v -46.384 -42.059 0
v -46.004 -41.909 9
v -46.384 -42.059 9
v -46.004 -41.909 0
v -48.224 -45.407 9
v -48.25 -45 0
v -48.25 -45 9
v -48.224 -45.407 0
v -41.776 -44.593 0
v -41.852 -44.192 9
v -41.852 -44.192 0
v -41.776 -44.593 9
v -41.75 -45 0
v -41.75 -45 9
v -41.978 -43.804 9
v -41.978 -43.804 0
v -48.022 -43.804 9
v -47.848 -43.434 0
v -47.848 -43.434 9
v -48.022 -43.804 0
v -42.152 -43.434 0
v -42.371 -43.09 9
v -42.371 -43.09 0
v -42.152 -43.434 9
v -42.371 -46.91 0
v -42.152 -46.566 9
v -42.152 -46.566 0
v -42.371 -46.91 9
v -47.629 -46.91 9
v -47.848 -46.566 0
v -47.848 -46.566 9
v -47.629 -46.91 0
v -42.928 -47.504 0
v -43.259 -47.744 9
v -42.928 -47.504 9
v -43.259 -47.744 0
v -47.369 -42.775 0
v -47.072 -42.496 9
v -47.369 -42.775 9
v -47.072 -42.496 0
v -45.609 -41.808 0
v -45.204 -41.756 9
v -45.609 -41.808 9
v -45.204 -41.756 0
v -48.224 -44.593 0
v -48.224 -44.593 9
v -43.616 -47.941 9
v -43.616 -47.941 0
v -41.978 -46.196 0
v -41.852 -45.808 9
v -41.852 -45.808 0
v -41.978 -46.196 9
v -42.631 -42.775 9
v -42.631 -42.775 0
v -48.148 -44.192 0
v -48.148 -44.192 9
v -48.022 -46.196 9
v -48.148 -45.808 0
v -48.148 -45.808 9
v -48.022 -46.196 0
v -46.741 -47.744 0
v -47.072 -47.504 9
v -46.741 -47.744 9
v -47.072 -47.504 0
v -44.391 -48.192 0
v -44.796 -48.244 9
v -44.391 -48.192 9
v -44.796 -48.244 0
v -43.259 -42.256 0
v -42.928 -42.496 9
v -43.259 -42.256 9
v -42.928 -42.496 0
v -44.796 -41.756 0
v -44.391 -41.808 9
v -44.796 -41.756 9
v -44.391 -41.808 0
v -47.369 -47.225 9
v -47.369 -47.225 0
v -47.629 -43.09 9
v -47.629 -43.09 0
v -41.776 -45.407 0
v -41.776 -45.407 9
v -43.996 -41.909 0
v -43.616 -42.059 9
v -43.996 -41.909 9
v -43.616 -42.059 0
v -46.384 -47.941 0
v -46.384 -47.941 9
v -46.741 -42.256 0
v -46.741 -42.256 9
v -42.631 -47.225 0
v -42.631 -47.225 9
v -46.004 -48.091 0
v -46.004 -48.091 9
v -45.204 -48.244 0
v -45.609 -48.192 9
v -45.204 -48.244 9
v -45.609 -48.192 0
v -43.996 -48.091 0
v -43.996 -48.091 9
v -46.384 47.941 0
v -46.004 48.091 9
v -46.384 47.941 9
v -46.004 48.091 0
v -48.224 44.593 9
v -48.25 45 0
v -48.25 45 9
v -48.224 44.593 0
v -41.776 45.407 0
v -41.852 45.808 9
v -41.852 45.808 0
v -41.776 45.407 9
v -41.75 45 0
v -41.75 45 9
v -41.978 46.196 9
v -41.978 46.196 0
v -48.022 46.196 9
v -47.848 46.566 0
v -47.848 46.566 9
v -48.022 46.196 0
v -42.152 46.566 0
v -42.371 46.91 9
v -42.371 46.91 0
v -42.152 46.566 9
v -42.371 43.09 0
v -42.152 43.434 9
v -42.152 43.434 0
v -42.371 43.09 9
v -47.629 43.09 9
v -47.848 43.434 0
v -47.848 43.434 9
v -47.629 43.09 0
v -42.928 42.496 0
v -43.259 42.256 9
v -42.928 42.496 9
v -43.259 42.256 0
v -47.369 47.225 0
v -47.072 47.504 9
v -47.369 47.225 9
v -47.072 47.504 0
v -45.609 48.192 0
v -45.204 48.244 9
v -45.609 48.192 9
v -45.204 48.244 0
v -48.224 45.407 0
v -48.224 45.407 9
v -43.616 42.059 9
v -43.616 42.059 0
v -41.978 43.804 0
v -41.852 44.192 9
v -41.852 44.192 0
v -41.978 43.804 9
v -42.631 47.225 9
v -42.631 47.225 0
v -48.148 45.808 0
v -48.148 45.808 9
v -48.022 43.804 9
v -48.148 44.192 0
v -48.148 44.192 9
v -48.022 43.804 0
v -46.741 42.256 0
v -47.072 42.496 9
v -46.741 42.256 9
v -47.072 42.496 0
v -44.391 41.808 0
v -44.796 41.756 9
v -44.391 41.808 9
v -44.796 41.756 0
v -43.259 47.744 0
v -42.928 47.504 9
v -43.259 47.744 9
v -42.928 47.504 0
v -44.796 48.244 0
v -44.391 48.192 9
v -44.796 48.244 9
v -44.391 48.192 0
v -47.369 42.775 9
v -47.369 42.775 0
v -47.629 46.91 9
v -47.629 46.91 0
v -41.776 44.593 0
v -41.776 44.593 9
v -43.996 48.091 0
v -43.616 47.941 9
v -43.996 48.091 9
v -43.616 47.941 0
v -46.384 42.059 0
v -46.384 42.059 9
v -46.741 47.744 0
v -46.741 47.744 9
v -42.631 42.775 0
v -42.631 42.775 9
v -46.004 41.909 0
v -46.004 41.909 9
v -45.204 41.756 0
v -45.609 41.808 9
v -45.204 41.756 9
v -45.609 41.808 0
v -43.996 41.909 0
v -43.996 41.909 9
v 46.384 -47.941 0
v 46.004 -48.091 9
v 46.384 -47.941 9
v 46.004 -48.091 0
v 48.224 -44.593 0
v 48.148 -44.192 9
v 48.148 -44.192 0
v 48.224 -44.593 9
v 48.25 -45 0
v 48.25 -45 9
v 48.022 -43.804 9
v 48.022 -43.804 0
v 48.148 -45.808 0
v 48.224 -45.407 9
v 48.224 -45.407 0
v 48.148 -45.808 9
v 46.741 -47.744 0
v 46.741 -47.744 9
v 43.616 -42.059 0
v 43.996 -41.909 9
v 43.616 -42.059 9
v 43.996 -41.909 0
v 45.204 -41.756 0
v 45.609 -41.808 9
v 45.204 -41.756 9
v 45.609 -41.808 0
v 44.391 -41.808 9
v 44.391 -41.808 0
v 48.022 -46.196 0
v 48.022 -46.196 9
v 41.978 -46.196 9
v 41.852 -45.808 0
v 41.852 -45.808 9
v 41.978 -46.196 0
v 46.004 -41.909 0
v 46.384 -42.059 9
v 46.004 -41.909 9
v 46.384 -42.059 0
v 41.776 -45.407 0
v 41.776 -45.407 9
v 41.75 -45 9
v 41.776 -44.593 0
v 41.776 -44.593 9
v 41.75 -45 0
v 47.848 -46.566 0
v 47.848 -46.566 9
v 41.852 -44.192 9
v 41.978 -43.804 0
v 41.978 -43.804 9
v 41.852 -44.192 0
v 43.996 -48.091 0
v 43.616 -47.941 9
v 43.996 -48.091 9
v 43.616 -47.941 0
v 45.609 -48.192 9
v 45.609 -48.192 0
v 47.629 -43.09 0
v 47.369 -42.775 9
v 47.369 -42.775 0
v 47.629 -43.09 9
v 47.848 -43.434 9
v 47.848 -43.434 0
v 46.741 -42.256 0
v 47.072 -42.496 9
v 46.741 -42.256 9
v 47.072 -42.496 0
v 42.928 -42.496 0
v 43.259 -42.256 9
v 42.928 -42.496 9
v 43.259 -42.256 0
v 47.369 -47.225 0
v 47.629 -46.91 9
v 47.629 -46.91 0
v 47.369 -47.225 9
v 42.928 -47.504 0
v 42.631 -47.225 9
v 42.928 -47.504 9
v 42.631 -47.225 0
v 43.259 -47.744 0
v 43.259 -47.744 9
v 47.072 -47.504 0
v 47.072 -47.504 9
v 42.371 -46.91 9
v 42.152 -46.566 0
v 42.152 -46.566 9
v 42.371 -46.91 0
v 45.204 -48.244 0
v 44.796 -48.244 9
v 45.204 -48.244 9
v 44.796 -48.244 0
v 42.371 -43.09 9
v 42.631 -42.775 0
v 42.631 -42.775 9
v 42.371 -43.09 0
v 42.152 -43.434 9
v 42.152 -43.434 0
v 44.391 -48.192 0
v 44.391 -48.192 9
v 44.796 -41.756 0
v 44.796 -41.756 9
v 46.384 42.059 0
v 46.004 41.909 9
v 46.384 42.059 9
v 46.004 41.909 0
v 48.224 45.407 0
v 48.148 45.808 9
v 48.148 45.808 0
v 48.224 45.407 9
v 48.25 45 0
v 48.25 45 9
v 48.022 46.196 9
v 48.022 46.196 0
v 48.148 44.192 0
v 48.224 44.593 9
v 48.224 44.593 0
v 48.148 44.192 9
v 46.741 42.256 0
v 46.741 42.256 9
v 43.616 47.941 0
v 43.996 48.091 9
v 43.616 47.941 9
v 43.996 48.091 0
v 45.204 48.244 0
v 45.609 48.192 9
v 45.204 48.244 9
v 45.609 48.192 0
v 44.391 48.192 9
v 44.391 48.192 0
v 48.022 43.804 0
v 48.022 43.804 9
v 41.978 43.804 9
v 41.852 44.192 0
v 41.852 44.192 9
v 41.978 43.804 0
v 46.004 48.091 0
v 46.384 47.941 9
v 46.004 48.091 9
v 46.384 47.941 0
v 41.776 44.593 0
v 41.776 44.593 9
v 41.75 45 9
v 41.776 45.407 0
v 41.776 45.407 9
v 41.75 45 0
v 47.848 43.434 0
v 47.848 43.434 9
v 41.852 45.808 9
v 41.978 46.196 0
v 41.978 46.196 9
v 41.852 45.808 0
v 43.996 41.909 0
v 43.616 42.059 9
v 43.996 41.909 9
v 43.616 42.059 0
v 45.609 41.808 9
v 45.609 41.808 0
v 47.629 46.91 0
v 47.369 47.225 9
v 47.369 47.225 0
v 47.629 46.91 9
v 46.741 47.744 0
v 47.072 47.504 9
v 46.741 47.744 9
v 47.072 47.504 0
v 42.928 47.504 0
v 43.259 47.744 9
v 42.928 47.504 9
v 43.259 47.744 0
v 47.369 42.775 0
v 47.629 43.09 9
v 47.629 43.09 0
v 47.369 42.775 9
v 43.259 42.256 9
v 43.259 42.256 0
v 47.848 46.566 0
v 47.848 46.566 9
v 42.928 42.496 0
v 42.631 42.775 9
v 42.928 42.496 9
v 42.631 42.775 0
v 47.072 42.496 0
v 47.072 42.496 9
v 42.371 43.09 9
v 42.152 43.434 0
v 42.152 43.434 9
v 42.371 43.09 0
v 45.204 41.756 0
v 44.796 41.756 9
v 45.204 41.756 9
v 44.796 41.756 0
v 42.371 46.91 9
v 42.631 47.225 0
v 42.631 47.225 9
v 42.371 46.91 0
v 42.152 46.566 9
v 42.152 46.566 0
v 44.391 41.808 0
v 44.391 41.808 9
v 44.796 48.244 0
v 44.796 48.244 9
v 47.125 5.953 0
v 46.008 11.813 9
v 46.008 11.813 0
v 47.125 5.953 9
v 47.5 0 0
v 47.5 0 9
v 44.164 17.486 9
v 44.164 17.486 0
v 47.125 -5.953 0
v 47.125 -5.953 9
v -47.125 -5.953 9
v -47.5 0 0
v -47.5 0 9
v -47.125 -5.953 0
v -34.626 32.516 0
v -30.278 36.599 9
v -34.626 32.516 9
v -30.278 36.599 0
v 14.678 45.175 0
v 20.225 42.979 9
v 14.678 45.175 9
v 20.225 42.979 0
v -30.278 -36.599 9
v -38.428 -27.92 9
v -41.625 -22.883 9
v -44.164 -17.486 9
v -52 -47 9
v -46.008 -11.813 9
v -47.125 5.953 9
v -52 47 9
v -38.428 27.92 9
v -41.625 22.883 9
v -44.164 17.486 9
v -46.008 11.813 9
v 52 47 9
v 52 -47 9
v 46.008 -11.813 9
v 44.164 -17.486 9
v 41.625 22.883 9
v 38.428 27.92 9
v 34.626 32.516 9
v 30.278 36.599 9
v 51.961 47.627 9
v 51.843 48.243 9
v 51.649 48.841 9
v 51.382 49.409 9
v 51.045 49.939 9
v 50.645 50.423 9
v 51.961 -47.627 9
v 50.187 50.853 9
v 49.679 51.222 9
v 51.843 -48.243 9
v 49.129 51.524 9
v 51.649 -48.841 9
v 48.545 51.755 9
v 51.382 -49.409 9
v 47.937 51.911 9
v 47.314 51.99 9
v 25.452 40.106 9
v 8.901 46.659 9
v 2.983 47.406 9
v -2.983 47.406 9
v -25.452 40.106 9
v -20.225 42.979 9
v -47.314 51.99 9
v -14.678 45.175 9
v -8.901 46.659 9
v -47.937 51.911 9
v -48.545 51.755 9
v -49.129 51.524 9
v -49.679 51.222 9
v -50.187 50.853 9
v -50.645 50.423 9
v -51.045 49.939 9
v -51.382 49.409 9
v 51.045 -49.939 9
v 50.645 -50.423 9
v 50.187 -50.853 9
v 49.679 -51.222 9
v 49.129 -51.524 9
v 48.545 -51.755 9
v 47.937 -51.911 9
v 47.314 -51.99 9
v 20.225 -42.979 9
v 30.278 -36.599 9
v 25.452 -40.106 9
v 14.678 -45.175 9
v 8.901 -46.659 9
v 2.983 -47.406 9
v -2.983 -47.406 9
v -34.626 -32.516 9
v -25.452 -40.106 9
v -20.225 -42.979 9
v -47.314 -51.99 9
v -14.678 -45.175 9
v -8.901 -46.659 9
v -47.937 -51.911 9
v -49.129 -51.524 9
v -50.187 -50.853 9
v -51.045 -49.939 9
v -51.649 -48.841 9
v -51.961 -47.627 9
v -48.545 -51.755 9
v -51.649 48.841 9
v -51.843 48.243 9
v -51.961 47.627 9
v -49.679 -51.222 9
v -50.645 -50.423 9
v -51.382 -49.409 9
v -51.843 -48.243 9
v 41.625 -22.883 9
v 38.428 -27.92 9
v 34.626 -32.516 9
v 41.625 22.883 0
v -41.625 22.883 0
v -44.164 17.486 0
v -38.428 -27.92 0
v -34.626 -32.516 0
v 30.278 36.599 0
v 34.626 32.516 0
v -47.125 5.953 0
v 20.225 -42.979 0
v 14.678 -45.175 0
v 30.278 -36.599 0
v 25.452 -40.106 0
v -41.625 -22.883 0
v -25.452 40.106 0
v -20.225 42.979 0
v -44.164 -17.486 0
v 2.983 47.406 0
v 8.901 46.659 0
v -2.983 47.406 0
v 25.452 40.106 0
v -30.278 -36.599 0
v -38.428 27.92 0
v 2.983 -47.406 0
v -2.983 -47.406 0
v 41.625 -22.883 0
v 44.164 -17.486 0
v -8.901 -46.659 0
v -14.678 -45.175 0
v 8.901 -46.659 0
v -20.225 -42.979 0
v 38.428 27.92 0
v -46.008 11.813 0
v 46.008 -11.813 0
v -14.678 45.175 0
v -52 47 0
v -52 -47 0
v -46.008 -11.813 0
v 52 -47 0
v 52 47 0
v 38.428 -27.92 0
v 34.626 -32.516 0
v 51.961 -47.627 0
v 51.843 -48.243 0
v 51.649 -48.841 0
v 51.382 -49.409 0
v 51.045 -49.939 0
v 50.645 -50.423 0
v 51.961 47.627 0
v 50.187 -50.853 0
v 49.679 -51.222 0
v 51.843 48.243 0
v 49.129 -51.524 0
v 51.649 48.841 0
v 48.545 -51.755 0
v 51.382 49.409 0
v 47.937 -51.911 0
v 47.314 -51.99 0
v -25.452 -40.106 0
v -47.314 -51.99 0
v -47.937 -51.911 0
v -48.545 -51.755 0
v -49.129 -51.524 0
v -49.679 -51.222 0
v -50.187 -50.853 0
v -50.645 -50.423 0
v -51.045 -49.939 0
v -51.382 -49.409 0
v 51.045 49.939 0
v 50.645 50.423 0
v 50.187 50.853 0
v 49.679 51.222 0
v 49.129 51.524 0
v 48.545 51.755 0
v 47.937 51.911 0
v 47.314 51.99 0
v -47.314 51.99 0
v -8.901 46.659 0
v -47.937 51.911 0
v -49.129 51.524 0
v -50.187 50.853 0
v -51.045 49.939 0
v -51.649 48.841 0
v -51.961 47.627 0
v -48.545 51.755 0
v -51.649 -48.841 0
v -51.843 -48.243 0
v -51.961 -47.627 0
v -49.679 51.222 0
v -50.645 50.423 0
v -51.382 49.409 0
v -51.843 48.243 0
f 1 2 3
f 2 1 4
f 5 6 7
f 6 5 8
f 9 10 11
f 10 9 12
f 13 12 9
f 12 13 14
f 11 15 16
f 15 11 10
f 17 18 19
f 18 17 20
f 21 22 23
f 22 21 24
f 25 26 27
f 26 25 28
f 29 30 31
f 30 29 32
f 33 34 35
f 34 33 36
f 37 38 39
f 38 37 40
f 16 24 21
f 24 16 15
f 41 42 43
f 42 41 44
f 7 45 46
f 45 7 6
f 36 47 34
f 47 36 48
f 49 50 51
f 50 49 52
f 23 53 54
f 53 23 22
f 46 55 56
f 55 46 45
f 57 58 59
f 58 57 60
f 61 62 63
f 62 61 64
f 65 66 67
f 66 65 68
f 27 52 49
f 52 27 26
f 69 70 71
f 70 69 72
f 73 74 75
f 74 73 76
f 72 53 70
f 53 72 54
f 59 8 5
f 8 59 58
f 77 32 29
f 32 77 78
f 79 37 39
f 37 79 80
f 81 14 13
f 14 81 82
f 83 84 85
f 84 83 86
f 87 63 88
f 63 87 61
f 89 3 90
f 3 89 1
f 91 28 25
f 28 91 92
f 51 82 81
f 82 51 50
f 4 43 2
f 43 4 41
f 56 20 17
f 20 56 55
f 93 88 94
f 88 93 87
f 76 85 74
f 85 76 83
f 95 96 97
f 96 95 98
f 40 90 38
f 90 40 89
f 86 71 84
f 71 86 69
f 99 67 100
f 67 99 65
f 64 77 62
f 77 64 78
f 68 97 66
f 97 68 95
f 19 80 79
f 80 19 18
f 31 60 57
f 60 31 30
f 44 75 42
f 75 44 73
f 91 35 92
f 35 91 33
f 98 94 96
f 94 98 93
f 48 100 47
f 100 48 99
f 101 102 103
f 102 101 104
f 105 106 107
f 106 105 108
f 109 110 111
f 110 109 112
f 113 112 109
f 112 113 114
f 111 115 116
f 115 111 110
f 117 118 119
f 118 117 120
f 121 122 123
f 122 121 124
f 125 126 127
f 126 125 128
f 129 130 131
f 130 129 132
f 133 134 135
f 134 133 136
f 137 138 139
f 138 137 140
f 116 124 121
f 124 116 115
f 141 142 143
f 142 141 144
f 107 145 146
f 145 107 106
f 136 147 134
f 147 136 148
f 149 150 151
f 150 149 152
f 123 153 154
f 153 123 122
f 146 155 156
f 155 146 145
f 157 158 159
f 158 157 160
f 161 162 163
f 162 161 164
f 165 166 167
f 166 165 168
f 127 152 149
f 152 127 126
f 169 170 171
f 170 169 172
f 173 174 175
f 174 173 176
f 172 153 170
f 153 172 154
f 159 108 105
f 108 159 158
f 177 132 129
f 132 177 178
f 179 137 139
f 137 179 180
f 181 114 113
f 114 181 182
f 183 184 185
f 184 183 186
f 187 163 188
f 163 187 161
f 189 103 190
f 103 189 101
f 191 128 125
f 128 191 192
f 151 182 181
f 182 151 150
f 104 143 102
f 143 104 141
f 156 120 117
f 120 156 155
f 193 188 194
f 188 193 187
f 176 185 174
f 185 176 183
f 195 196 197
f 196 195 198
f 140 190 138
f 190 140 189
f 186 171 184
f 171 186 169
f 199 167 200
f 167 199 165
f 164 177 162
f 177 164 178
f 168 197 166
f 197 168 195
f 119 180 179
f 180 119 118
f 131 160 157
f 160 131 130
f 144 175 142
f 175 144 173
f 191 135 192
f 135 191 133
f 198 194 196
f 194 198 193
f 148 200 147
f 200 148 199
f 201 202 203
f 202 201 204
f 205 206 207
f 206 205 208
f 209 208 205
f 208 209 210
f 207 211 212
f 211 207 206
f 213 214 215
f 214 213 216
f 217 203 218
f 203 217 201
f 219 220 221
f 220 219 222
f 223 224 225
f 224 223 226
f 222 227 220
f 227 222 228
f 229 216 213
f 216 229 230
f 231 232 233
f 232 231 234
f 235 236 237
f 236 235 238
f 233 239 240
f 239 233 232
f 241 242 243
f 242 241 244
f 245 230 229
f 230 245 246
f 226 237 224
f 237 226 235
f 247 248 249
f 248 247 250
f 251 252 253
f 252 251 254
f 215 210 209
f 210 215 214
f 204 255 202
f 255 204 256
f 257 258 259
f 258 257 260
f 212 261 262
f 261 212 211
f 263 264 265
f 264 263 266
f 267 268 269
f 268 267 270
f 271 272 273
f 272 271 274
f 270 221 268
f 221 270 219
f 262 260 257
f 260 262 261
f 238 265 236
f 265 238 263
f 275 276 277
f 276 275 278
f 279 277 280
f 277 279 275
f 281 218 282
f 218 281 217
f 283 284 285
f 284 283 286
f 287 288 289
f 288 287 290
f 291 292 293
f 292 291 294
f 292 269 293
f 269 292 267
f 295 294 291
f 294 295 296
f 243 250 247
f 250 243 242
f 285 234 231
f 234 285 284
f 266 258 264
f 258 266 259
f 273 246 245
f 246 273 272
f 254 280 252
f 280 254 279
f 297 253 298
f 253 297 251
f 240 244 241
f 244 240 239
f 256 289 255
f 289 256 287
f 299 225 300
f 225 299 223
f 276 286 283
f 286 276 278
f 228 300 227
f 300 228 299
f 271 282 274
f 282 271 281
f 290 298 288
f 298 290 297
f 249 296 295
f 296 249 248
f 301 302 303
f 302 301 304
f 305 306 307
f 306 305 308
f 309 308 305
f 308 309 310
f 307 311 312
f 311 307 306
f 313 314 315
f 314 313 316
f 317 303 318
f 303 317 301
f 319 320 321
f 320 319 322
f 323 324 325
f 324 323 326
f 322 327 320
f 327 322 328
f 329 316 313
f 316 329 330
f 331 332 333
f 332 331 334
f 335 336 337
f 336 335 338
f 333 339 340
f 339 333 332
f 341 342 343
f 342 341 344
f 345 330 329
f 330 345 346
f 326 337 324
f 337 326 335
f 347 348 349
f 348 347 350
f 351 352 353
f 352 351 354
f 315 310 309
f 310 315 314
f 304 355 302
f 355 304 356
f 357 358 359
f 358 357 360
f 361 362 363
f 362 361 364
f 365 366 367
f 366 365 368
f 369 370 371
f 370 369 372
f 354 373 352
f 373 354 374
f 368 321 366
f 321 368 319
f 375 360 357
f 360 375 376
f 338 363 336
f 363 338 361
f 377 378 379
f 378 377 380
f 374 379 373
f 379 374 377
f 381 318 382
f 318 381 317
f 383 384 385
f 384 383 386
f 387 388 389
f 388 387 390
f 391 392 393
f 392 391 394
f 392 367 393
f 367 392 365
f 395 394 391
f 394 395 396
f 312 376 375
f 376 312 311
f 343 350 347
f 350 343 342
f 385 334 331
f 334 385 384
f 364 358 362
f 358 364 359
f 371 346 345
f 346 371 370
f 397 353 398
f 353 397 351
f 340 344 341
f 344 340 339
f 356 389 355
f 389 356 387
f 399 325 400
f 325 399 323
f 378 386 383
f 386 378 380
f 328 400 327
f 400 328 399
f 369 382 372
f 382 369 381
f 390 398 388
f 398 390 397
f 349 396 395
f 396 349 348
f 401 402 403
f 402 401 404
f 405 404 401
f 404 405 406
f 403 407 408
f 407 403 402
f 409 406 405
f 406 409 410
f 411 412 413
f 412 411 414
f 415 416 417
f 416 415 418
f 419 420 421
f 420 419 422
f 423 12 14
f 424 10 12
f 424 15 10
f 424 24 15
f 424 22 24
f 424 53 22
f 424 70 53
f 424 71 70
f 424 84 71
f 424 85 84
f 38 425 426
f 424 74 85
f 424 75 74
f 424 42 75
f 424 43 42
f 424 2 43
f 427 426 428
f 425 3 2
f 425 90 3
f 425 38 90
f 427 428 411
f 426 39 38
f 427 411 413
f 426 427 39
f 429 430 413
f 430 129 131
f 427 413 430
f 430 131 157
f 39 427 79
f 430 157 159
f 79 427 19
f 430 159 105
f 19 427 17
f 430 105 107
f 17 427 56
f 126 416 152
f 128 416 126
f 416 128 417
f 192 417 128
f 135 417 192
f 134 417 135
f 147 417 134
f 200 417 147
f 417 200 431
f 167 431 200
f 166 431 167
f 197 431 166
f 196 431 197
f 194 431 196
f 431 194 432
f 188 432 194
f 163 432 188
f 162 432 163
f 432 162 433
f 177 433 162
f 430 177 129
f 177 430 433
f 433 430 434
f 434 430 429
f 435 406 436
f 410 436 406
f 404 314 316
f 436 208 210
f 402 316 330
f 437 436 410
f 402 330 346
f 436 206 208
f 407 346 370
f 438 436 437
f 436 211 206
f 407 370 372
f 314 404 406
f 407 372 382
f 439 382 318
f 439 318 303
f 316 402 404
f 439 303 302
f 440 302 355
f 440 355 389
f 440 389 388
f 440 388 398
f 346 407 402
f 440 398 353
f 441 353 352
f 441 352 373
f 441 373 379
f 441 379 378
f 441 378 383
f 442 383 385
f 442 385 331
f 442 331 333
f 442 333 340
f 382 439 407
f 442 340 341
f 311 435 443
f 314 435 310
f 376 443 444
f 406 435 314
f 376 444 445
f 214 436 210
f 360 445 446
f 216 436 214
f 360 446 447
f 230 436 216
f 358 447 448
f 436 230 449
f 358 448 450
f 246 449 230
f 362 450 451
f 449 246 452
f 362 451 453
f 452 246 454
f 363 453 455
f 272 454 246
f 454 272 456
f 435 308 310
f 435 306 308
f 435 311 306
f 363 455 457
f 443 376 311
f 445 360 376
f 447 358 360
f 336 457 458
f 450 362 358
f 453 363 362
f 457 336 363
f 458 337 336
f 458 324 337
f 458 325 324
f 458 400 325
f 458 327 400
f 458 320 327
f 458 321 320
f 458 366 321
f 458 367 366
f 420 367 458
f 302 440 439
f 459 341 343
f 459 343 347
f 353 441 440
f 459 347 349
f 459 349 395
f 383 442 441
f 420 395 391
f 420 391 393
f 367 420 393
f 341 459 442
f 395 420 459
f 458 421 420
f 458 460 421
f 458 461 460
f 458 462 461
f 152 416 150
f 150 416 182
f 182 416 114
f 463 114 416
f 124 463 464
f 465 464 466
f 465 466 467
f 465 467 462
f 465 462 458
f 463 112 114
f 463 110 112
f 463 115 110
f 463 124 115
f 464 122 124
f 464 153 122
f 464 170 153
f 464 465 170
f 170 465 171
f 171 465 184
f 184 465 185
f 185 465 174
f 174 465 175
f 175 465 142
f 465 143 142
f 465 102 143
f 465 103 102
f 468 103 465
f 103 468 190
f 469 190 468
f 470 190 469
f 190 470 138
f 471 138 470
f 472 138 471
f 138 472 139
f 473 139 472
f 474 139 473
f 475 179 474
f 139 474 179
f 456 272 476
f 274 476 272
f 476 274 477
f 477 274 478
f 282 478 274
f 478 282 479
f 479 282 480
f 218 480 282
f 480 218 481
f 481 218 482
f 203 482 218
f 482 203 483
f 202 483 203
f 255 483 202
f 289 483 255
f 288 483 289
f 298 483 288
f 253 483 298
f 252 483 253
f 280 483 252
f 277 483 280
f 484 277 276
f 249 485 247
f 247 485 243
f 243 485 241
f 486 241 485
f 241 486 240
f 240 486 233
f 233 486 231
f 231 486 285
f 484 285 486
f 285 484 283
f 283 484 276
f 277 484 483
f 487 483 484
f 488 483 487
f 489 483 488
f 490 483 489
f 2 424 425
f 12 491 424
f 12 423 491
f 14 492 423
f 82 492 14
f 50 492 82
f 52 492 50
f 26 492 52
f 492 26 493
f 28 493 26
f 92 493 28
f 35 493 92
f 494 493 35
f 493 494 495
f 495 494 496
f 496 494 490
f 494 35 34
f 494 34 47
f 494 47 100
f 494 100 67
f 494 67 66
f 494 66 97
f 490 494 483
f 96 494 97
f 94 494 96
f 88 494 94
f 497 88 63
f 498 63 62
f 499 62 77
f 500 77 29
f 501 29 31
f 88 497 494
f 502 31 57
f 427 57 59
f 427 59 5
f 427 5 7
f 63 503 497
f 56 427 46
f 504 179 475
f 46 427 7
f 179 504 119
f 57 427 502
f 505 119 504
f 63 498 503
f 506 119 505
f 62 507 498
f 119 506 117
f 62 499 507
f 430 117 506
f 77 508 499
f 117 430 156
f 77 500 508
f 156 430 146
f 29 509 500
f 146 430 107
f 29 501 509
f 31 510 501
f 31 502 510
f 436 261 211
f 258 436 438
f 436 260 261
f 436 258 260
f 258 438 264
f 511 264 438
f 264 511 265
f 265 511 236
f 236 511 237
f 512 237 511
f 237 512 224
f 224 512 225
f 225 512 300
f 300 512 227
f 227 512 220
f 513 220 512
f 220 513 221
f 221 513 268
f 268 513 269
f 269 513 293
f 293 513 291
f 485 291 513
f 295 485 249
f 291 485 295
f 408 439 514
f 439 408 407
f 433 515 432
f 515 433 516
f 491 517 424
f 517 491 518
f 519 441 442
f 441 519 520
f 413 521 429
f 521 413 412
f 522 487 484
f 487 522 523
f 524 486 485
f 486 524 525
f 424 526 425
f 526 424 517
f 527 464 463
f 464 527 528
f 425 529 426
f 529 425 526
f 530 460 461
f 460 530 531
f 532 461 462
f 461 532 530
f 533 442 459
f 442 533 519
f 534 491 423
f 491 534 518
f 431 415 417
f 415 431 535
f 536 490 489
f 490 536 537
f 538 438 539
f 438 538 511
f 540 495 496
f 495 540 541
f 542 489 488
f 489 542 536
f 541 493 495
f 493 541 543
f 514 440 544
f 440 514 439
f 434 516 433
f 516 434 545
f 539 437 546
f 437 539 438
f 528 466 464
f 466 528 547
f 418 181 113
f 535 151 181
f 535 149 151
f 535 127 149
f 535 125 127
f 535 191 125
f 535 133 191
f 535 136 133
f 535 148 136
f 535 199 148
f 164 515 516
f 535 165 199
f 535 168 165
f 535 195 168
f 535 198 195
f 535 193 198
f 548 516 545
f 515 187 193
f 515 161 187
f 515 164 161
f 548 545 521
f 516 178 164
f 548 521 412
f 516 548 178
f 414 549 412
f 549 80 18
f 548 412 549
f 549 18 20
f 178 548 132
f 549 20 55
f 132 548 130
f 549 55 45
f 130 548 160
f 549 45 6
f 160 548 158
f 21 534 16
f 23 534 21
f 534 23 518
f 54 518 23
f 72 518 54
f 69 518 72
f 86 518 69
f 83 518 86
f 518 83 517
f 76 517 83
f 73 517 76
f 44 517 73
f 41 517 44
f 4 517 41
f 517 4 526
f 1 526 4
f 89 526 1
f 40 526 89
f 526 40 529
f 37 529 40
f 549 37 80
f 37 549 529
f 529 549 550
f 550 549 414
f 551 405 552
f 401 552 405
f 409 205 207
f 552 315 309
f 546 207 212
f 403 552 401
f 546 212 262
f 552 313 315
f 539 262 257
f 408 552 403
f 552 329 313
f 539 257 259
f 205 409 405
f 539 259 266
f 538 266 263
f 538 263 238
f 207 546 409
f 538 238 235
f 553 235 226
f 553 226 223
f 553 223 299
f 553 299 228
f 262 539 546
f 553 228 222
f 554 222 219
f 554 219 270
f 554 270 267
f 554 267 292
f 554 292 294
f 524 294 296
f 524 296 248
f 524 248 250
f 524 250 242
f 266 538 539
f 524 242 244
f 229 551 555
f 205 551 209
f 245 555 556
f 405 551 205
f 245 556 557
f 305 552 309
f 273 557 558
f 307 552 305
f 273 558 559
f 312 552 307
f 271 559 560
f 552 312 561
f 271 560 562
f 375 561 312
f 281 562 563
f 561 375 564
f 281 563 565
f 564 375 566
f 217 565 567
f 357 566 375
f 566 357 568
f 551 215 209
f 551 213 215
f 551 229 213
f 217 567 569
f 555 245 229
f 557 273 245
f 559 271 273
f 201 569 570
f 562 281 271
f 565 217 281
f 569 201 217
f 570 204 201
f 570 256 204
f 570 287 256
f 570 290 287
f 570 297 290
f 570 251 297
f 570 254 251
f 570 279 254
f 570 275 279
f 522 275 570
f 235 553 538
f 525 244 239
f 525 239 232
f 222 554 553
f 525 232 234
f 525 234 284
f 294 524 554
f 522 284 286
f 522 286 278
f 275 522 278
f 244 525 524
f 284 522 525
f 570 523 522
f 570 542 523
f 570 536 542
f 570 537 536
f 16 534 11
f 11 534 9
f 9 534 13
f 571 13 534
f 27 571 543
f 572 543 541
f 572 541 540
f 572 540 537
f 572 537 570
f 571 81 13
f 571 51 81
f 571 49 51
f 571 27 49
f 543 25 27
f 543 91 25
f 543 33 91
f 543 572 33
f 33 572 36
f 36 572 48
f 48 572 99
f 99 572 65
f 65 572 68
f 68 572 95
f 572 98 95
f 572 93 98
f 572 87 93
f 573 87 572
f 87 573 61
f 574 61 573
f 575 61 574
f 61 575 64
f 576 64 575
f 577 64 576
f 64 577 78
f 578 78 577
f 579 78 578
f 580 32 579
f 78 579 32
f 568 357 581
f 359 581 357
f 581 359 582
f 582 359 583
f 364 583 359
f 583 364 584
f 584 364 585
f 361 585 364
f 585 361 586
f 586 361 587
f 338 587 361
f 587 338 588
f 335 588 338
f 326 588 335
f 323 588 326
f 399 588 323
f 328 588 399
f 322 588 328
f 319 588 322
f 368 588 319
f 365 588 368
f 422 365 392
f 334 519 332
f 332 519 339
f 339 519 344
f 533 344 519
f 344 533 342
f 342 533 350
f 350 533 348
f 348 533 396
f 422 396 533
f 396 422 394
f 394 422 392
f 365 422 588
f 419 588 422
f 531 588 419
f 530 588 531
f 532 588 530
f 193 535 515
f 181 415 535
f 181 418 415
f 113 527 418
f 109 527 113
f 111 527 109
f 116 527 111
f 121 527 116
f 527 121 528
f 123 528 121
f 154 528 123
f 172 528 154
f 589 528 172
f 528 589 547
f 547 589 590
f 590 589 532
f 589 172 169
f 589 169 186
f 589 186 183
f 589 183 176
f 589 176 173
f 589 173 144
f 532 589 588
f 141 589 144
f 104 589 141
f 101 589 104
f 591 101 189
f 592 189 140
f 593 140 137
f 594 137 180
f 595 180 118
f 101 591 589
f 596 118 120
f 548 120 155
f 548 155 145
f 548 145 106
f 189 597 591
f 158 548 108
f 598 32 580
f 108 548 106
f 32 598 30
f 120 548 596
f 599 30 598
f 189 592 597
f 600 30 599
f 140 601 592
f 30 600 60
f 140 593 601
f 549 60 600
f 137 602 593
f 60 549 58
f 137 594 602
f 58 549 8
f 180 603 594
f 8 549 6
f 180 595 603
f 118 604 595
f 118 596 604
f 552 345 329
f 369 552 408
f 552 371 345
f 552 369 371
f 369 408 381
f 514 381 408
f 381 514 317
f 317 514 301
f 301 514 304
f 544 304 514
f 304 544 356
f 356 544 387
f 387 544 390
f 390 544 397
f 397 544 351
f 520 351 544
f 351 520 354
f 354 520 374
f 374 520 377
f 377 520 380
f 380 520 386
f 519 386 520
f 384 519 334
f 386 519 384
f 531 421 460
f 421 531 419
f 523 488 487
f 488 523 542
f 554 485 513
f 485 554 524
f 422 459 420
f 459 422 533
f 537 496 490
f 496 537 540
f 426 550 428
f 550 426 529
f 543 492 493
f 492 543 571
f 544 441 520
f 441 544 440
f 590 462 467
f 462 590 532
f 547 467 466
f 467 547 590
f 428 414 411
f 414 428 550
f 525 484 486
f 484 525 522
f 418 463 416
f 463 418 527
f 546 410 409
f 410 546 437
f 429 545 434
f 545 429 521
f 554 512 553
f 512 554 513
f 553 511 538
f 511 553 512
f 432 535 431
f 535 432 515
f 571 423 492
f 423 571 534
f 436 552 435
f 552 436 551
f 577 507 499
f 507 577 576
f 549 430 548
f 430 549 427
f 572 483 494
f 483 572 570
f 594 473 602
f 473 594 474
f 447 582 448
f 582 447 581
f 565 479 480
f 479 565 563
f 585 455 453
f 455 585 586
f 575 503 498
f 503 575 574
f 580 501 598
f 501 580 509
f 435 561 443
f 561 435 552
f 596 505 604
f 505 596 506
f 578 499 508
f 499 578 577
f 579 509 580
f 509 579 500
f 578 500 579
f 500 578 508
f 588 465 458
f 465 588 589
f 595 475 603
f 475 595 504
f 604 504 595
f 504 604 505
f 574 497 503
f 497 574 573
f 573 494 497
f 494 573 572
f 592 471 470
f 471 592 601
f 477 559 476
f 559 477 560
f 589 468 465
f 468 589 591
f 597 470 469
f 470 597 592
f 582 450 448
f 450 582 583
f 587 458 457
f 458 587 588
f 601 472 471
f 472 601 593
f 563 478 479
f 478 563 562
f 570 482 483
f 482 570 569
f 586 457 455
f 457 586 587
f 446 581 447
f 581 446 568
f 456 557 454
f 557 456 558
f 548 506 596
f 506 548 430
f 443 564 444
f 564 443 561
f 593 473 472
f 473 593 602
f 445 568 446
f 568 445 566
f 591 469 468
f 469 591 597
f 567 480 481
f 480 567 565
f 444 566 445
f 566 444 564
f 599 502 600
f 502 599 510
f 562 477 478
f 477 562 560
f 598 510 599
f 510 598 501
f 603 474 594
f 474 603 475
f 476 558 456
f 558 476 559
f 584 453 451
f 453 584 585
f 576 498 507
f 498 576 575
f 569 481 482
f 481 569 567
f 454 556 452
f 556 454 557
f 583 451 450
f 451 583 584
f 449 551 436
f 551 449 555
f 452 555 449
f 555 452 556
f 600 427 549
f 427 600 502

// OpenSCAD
$fn = 50;

difference() {
	union() {
		hull() {
			translate(v = [-47.0, 47.0, 0]) {
				cylinder(h = 9, r = 5);
			}
			translate(v = [47.0, 47.0, 0]) {
				cylinder(h = 9, r = 5);
			}
			translate(v = [-47.0, -47.0, 0]) {
				cylinder(h = 9, r = 5);
			}
			translate(v = [47.0, -47.0, 0]) {
				cylinder(h = 9, r = 5);
			}
		}
	}
	union() {
		translate(v = [-45.0, -45.0, -100.0]) {
			cylinder(h = 200, r = 3.25);
		}
		translate(v = [-45.0, 45.0, -100.0]) {
			cylinder(h = 200, r = 3.25);
		}
		translate(v = [45.0, -45.0, -100.0]) {
			cylinder(h = 200, r = 3.25);
		}
		translate(v = [45.0, 45.0, -100.0]) {
			cylinder(h = 200, r = 3.25);
		}
		translate(v = [-45.0, -45.0, -100.0]) {
			cylinder(h = 200, r = 1.8);
		}
		translate(v = [-45.0, 45.0, -100.0]) {
			cylinder(h = 200, r = 1.8);
		}
		translate(v = [45.0, -45.0, -100.0]) {
			cylinder(h = 200, r = 1.8);
		}
		translate(v = [45.0, 45.0, -100.0]) {
			cylinder(h = 200, r = 1.8);
		}
		cylinder(h = 9, r = 47.5);
	}
}
